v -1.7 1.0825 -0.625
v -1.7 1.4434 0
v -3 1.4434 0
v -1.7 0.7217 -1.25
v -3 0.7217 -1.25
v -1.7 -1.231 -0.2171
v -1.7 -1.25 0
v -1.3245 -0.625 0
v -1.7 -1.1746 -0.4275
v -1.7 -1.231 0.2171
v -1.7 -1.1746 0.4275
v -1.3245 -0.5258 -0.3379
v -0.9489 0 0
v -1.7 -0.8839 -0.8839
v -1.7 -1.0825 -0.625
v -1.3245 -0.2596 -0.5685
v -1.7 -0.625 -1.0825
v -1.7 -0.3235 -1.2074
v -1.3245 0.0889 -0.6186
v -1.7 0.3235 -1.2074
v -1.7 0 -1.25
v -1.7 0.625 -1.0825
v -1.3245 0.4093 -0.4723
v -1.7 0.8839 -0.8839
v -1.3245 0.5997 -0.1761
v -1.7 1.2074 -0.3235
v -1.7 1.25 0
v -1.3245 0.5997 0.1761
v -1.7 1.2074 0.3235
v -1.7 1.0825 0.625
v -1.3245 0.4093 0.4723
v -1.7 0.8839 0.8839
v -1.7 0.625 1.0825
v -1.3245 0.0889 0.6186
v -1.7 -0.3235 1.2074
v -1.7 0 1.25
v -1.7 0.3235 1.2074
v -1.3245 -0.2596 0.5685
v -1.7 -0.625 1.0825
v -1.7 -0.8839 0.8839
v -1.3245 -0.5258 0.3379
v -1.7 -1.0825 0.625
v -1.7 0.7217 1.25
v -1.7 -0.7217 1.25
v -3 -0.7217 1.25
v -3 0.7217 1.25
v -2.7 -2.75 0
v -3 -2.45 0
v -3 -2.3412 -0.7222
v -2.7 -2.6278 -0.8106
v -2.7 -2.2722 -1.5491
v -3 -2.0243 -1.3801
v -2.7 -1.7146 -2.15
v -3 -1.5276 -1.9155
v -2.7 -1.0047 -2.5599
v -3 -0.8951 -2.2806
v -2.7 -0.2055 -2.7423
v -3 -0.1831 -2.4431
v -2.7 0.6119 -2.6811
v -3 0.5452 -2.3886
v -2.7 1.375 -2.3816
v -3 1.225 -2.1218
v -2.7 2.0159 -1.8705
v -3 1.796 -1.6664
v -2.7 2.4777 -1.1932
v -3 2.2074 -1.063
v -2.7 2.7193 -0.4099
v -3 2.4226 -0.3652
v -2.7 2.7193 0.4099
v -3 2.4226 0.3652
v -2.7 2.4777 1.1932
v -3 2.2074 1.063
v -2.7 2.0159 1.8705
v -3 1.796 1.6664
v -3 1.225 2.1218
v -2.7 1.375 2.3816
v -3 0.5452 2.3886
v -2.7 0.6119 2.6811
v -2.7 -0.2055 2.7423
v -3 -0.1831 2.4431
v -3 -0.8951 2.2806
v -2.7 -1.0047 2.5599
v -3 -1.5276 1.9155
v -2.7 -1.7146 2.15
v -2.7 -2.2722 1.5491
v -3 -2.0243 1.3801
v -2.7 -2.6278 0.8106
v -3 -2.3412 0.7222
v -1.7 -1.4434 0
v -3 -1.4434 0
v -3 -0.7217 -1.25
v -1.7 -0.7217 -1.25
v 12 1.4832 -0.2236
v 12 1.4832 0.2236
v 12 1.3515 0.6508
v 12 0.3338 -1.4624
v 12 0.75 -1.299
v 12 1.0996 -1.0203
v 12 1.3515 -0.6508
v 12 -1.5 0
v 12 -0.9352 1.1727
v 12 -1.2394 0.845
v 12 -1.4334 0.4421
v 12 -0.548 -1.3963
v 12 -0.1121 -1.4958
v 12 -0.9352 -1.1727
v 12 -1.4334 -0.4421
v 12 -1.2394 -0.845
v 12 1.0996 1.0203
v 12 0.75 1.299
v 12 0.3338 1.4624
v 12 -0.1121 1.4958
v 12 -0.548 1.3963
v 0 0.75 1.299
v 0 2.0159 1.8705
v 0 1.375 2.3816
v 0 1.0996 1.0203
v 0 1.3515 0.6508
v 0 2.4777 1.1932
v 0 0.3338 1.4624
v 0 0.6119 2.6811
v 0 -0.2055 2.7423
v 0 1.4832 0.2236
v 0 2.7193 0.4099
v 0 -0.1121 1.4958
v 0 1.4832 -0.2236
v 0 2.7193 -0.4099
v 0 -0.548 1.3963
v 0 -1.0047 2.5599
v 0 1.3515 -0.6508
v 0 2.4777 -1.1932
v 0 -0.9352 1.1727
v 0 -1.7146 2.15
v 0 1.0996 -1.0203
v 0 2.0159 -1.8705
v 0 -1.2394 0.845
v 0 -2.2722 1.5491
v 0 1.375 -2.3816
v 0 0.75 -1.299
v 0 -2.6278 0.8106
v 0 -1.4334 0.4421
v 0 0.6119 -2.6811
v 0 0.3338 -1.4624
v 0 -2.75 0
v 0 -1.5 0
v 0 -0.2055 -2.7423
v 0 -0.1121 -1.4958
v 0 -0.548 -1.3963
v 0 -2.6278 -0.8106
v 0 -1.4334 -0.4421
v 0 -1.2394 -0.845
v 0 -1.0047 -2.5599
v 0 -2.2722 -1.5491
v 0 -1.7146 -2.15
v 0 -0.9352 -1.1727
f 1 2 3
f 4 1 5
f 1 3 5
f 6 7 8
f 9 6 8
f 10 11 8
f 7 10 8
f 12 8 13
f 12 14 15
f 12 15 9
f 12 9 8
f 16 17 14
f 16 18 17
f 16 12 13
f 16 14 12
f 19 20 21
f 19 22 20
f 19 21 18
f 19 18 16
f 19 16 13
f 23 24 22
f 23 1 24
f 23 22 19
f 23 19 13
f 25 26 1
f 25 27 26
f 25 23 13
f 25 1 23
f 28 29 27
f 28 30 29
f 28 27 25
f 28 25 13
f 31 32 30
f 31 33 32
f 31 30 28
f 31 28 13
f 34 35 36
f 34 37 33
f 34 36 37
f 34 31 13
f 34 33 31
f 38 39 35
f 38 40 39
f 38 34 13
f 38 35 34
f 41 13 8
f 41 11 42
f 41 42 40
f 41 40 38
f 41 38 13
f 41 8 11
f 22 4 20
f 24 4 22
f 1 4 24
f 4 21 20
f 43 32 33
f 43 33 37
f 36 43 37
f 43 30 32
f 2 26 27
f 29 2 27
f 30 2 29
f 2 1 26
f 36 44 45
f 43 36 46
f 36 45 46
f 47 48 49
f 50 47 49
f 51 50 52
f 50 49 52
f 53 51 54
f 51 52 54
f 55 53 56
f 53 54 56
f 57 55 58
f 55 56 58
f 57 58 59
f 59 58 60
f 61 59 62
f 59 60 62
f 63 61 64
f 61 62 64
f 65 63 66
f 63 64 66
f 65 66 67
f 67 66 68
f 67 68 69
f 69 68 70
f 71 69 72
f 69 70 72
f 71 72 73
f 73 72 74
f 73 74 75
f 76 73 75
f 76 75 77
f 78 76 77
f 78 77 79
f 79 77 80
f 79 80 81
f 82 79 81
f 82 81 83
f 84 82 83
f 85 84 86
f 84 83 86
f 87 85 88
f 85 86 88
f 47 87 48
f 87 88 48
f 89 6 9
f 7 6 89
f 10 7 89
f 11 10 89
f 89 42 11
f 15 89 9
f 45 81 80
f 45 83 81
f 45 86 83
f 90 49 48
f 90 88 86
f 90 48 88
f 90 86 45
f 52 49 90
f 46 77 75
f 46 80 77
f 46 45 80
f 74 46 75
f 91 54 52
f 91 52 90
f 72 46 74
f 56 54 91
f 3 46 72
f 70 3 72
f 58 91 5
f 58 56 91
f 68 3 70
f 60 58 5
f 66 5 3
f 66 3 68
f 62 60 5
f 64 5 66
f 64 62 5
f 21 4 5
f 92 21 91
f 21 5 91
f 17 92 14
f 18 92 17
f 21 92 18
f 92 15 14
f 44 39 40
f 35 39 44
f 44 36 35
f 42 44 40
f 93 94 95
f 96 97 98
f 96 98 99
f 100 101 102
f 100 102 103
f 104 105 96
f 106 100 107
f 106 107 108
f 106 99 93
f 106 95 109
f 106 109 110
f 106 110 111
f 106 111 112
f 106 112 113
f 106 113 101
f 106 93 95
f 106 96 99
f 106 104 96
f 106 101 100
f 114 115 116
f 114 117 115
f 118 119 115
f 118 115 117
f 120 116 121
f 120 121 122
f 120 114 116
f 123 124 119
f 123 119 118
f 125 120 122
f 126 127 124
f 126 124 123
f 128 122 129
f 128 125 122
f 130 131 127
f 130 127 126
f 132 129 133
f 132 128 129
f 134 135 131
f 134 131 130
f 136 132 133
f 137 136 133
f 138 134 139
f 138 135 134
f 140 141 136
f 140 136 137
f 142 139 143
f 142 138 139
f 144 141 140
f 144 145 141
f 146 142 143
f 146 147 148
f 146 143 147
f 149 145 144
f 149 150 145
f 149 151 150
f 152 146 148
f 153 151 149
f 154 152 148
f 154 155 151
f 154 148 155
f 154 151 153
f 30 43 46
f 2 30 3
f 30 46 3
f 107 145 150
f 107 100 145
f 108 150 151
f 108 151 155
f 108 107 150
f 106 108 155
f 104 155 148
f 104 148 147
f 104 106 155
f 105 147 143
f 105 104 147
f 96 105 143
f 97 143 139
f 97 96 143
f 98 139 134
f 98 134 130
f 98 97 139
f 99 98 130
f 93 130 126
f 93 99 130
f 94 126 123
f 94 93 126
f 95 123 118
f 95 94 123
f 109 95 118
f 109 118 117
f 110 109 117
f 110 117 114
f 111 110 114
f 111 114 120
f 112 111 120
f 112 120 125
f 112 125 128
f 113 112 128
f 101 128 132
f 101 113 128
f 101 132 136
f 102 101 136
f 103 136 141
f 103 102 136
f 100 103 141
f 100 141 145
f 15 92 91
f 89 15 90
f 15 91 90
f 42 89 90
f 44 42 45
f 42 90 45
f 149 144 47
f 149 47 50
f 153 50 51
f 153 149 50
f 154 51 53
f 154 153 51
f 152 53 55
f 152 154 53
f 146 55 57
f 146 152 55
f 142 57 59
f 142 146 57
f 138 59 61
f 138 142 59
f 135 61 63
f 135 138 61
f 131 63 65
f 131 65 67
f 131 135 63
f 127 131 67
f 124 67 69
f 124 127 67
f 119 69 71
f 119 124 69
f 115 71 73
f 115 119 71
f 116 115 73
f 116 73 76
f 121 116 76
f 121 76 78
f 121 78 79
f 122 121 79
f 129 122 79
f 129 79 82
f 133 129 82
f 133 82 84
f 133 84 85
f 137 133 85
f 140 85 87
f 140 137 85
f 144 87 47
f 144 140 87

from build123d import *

# Parameters (mm, degrees)
CUT_EXTRUDE1_DEPTH = 1.3
CHAMFER1_SIZE      = 0.3


with BuildPart() as part:
    # Sketch1 → Revolve1 (revolve)
    with BuildSketch(Plane.XY, mode=Mode.PRIVATE) as revolve1_sk:
        Polygon((0, 1.5), (12, 1.5), (12, 0), (-3, 0), (-3, 2.75), (0, 2.75), align=None)
    revolve(revolve1_sk.sketch.rotate(Axis((-3, 0, 0), (1, 0, 0)), 180), axis=Axis((-3, 0, 0), (1, 0, 0)))

    # Sketch2 → Cut-Revolve1 (revolve, cut)
    with BuildSketch(Plane.XY, mode=Mode.PRIVATE) as cut_revolve1_sk:
        Polygon((-0.948924226, 0), (-1.7, 1.25), (-3, 1.25), (-3, 0), align=None)
    revolve(cut_revolve1_sk.sketch.rotate(Axis((-3, 0, 0), (1, 0, 0)), 180), axis=Axis((-3, 0, 0), (1, 0, 0)), mode=Mode.SUBTRACT)

    # Sketch3 → Cut-Extrude1 (cut)
    with BuildSketch(Plane.ZY.offset(3)):
        Polygon((1.25, 0.721687836), (0, 1.443375673), (-1.25, 0.721687836), (-1.25, -0.721687836), (0, -1.443375673), (1.25, -0.721687836), align=None)
    extrude(amount=-CUT_EXTRUDE1_DEPTH, mode=Mode.SUBTRACT)

    # Chamfer1
    chamfer1_edges = [part.edges().sort_by_distance(p)[0] for p in [
        (-3, 2.75, 0),
    ]]
    chamfer(chamfer1_edges, length=CHAMFER1_SIZE)


solid = part.part
